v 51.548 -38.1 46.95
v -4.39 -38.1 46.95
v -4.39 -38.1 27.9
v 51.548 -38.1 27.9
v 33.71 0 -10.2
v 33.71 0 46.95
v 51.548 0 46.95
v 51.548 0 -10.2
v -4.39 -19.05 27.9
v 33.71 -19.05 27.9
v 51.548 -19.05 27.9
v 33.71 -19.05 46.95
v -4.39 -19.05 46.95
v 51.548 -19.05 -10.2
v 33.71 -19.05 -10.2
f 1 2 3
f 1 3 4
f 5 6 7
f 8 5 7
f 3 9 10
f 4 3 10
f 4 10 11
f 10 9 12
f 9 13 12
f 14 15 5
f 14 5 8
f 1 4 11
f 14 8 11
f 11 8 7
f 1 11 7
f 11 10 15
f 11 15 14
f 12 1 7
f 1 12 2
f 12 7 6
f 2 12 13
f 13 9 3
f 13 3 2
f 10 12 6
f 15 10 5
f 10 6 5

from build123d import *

# Parameters (mm, degrees)
F0_W     = 17.837725
F0_H     = 19.05
F1_DEPTH = 19.05
F2_W     = 17.837725
F2_H     = 19.05
F2_W_2   = 19.05
F3_DEPTH = 19.05


with BuildPart() as f1:
    # F0 (on Front) → F1 (new body)
    with BuildSketch(Plane.XZ):
        with Locations((42.629033, 37.424813)):
            Rectangle(F0_W, F0_H)
        with Locations((42.629033, 18.374813)):
            Rectangle(F0_W, F0_H)
        with Locations((42.629033, -0.675187)):
            Rectangle(F0_W, F0_H)
    extrude(amount=F1_DEPTH)

    # F2 (on face) → F3 (join)
    with BuildSketch(Plane.XZ.offset(19.05)):
        with Locations((42.629033, 37.424813)):
            Rectangle(F2_W, F2_H)
        with Locations((24.185171, 37.424813)):
            Rectangle(F2_W_2, F2_H)
        with Locations((5.135171, 37.424813)):
            Rectangle(F2_W_2, F2_H)
    extrude(amount=F3_DEPTH)


solid = f1.part
